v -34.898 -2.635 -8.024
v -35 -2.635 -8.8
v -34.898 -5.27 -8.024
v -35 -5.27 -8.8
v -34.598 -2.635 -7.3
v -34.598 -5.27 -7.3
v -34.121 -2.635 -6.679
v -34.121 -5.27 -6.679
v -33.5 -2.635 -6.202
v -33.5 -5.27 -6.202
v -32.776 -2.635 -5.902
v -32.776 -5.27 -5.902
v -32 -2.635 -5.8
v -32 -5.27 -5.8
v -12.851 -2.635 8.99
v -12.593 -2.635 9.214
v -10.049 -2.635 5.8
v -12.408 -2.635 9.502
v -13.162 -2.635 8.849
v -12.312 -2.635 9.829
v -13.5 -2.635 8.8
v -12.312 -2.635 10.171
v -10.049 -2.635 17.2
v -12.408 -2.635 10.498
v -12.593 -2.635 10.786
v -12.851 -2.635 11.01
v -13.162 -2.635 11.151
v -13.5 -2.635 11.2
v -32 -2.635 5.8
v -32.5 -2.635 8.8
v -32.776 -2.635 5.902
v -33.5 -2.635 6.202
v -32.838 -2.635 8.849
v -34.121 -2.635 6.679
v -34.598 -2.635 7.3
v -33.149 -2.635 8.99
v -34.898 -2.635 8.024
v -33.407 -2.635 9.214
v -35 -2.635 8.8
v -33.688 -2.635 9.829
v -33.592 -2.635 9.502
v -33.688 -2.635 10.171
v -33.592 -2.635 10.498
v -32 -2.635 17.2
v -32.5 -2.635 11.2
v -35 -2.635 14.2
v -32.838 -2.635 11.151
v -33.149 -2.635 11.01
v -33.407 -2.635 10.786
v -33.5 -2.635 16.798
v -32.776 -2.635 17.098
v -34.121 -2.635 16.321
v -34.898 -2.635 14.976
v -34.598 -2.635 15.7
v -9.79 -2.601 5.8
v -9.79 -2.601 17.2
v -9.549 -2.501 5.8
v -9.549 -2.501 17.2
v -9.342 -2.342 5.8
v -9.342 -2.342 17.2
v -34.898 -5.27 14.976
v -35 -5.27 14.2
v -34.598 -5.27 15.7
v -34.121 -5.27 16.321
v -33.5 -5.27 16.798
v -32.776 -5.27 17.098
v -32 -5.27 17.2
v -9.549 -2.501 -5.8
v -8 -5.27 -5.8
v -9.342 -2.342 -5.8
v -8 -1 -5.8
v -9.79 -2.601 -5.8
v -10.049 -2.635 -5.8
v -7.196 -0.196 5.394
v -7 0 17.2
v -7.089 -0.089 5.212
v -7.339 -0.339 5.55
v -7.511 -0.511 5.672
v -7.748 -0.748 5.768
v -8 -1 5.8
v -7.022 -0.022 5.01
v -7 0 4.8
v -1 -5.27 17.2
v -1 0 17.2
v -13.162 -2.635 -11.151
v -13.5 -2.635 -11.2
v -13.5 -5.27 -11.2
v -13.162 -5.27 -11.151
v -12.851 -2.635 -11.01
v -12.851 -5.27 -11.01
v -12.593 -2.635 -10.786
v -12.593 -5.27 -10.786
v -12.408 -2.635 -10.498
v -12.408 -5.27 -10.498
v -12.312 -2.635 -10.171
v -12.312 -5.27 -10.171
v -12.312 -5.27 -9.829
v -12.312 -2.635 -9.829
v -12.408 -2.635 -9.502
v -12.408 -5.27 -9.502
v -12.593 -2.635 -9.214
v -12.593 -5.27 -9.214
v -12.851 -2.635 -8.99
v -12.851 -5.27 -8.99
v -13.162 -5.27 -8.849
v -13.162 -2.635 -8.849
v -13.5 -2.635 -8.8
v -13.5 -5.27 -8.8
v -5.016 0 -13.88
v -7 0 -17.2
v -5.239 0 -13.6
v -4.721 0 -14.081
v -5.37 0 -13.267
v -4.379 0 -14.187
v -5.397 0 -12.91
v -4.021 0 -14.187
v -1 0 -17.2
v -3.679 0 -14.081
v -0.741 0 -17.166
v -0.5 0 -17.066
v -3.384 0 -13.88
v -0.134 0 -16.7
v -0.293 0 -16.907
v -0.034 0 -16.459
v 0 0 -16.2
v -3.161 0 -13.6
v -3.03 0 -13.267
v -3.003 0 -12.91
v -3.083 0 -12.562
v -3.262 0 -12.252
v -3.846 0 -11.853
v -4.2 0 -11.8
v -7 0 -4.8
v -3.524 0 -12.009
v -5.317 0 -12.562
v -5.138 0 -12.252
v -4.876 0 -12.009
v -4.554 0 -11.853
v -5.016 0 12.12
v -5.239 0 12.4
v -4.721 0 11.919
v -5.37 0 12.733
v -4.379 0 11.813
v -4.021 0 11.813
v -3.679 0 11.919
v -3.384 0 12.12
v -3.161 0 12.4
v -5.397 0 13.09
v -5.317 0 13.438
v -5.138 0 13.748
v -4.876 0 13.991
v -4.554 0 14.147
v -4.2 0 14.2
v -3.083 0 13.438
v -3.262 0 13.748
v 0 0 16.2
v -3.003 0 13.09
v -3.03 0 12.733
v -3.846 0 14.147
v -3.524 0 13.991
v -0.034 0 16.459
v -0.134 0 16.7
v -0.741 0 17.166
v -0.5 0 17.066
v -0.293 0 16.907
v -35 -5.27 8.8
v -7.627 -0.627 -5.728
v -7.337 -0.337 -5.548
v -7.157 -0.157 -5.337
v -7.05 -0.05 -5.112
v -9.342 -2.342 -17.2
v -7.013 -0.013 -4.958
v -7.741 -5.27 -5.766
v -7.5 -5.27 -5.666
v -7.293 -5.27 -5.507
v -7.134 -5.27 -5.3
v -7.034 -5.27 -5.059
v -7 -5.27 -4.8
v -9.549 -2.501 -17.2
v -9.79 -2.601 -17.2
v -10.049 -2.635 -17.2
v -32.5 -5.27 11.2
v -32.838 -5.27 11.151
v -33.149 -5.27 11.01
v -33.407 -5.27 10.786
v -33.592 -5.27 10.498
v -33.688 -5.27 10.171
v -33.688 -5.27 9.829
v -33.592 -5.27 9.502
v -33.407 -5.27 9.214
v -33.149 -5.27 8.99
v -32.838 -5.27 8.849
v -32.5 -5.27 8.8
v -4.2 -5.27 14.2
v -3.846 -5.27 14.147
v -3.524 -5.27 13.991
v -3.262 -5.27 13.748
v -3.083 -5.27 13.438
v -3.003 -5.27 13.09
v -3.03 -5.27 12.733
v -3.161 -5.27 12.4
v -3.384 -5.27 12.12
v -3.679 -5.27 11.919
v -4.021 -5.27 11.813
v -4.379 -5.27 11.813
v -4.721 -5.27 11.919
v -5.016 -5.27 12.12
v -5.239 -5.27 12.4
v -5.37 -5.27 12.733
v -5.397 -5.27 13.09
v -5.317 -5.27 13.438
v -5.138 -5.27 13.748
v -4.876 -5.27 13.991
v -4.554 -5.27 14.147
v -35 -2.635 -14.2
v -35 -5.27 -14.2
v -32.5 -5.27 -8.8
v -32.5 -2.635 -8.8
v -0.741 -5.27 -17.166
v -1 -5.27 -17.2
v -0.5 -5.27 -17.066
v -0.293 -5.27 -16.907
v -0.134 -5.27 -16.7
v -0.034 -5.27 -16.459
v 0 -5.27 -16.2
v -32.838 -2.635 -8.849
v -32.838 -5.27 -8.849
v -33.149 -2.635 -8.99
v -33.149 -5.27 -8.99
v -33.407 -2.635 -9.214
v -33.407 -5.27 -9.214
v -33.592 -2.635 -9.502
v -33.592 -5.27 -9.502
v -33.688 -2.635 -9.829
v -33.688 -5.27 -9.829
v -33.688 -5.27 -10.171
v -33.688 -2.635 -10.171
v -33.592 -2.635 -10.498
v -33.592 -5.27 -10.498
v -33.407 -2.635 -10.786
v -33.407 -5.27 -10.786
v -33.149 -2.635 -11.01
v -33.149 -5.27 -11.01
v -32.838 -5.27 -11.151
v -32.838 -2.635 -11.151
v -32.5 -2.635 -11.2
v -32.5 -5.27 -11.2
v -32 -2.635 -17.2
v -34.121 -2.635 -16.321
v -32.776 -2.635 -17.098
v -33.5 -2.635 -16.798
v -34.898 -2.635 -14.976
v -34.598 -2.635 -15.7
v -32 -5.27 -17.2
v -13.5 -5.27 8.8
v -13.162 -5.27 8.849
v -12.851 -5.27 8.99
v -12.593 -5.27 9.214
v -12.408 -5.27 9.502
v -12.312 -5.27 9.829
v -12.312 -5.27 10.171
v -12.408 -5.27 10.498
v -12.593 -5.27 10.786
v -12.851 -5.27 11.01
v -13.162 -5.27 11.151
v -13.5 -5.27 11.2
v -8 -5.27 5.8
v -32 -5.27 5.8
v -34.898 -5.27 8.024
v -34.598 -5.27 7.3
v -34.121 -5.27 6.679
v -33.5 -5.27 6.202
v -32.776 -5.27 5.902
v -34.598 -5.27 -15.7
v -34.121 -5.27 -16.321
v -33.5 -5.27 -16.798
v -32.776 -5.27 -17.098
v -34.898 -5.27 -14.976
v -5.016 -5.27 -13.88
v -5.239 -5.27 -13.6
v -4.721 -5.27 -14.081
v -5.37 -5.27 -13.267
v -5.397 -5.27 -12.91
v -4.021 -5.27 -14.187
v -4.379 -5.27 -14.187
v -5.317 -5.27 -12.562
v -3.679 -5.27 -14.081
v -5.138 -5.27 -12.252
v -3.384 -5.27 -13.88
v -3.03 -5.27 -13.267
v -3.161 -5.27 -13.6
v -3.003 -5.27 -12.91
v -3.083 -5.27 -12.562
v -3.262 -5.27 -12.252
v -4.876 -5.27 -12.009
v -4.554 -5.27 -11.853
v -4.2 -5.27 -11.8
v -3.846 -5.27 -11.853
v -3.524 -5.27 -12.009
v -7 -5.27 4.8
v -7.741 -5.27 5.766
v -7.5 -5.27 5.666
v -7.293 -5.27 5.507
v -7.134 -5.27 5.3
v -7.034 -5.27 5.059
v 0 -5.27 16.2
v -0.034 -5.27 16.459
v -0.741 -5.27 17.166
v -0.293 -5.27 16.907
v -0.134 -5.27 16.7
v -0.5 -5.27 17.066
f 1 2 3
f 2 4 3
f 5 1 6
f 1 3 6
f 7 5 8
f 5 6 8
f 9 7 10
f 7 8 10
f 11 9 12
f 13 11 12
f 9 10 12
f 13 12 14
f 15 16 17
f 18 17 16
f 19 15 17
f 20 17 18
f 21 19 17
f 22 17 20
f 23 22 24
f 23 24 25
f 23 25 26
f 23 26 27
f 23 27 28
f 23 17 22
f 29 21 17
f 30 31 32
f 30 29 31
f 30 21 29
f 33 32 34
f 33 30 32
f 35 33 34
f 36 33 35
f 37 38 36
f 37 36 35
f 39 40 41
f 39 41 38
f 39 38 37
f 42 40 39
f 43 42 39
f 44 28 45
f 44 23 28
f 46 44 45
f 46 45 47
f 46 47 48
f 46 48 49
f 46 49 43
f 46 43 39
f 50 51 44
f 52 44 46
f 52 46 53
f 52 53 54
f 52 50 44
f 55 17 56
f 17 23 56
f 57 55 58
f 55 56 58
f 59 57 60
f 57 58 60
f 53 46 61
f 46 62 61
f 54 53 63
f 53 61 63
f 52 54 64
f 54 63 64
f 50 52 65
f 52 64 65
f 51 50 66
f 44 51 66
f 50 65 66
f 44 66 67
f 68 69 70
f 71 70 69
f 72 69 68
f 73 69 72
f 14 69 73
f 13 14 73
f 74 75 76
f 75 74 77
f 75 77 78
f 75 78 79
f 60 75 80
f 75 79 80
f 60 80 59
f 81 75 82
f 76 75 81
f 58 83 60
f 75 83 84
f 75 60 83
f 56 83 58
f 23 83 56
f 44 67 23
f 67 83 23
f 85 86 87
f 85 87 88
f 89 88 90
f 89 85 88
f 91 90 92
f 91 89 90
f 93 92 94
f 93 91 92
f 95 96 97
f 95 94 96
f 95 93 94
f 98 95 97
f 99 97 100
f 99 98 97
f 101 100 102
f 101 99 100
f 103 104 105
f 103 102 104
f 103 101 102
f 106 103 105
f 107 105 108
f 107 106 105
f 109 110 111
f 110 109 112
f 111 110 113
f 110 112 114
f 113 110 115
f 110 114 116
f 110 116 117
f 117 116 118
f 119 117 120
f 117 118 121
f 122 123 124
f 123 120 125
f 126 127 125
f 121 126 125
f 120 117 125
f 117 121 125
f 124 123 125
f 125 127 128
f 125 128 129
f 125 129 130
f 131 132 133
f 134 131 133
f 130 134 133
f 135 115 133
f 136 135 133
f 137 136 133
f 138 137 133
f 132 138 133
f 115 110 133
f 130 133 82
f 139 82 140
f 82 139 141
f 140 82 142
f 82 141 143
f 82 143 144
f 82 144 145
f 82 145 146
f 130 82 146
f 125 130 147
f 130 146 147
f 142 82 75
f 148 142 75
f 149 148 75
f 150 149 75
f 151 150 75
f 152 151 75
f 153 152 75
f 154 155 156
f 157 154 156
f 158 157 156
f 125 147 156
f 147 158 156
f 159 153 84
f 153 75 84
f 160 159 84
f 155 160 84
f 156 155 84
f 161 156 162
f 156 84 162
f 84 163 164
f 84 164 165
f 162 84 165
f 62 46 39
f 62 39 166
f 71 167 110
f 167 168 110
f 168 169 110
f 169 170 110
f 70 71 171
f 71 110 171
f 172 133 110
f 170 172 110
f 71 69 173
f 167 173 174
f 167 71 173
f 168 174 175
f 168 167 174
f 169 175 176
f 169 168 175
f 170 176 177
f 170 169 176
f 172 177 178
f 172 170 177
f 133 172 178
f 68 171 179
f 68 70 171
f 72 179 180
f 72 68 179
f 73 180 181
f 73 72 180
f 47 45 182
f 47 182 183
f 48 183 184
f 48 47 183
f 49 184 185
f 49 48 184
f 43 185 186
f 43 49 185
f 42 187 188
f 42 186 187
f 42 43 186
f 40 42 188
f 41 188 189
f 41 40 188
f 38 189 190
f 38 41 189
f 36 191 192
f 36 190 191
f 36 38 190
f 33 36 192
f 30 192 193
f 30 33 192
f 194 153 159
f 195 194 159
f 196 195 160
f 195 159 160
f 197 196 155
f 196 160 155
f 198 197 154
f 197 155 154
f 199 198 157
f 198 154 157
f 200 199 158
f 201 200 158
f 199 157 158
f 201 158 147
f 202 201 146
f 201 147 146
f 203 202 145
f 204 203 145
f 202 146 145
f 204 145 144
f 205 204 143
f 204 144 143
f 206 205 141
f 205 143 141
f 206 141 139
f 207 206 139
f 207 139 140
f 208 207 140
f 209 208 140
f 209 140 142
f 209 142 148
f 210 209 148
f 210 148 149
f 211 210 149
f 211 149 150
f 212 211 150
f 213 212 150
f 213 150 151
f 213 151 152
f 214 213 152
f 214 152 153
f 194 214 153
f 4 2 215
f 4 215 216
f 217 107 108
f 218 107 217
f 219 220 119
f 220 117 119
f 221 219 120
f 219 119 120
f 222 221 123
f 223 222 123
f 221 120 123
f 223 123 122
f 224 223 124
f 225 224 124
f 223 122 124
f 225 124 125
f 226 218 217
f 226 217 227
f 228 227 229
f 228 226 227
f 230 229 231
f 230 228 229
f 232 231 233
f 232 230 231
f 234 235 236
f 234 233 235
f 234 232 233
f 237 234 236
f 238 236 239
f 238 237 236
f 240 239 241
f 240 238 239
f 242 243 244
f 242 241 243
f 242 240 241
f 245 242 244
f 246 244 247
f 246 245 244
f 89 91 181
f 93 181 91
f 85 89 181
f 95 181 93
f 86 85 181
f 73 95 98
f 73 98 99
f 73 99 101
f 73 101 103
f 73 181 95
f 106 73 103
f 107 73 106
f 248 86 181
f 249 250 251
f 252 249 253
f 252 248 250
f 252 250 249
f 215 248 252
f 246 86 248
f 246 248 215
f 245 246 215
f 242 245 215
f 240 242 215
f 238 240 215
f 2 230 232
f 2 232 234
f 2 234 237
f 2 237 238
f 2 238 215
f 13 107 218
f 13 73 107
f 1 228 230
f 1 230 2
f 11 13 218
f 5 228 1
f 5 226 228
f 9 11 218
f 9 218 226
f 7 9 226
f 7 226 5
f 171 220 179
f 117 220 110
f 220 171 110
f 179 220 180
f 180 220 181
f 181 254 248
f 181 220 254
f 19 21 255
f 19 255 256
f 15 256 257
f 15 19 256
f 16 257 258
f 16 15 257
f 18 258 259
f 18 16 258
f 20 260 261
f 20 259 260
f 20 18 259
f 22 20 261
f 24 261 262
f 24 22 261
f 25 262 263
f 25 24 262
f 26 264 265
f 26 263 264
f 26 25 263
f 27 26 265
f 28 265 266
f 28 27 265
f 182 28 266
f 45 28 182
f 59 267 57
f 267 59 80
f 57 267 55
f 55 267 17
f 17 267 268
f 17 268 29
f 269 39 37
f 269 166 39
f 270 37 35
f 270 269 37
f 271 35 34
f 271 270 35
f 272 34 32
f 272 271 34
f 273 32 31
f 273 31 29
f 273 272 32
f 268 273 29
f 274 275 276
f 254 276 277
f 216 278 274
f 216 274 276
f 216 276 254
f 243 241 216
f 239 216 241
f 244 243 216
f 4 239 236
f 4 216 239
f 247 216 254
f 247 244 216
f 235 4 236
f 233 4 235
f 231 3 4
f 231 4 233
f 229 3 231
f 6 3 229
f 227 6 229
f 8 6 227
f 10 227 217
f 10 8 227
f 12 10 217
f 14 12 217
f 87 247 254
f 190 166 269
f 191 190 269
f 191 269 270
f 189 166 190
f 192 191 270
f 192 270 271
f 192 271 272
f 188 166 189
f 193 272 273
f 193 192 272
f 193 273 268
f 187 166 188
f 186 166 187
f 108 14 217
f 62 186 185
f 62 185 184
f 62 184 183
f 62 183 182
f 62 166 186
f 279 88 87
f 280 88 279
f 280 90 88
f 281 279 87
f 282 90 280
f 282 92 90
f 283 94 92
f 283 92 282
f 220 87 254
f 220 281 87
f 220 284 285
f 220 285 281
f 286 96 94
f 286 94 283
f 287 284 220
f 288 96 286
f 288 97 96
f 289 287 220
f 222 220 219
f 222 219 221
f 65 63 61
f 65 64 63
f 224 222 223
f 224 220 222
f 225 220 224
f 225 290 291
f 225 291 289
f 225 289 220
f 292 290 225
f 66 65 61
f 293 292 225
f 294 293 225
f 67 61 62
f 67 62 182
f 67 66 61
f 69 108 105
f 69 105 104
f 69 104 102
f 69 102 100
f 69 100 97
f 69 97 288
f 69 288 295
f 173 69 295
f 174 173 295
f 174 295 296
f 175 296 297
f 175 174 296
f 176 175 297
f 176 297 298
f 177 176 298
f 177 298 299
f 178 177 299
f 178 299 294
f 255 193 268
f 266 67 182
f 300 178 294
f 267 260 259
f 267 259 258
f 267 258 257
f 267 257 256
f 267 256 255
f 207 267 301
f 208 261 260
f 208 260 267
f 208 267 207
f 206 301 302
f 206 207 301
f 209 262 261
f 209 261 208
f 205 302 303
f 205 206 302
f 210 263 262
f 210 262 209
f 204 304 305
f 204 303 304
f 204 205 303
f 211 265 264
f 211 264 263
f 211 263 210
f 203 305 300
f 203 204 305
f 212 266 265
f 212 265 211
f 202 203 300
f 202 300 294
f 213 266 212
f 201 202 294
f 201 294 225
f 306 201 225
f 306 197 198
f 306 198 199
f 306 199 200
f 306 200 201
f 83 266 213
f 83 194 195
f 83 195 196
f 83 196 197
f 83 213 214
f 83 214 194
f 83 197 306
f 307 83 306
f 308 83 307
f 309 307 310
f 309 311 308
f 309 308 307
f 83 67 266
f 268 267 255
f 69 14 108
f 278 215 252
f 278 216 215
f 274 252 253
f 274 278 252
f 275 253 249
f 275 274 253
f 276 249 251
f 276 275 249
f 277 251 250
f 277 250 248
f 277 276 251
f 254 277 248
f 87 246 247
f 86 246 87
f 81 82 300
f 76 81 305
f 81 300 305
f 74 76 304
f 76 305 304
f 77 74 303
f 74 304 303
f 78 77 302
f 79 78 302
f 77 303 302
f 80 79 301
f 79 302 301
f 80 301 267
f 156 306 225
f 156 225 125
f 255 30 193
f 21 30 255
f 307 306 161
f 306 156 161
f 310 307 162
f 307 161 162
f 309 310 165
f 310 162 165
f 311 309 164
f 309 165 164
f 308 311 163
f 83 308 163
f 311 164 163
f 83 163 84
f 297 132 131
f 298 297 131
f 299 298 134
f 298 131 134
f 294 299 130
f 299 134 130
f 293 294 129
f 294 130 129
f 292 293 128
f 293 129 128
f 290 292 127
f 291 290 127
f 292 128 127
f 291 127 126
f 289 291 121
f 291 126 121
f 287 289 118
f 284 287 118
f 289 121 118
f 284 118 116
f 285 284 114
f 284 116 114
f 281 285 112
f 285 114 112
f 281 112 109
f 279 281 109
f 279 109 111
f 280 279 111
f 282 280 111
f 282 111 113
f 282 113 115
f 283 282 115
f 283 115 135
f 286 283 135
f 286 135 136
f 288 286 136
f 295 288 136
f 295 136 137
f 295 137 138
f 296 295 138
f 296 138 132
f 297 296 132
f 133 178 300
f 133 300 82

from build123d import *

# Parameters (mm, degrees)
SKETCH1_W           = 7
SKETCH1_H           = 2.635
BOSS_EXTRUDE1_DEPTH = 17.2
CUT_EXTRUDE1_REACH  = 41.352
SKETCH2_R           = 1.2
CUT_EXTRUDE2_REACH  = 41.087
SKETCH3_W           = 28
SKETCH3_H           = 11.6
CHAMFER1_SIZE       = 2.635
FILLET2_R           = 1
FILLET3_R           = 3
FILLET4_R           = 1


with BuildPart() as part:
    # Sketch1 → Boss-Extrude1 (new, symmetric)
    with BuildSketch(Plane.XY):
        Polygon((0, -5.27), (0, -2.635), (-7, -2.635), (-35, -2.635), (-35, -5.27), align=None)
        with Locations((-3.5, -1.3175)):
            Rectangle(SKETCH1_W, SKETCH1_H)
    extrude(amount=BOSS_EXTRUDE1_DEPTH, both=True)

    # Sketch2 → Cut-Extrude1 (cut, up to next)
    with BuildSketch(Plane(origin=(0, 0, 0), x_dir=(1, 0, 0), z_dir=(0, 1, 0)), mode=Mode.PRIVATE) as cut_extrude1_sk1:
        with Locations(Location((-4.2, 13, 0), (0, 0, 270))):
            Circle(SKETCH2_R)
    cut_extrude1_tool1 = extrude(cut_extrude1_sk1.sketch, amount=-CUT_EXTRUDE1_REACH, mode=Mode.PRIVATE) & part.part
    # Sketch2 → Cut-Extrude1 (cut, up to next)
    with BuildSketch(Plane(origin=(0, 0, 0), x_dir=(1, 0, 0), z_dir=(0, 1, 0)), mode=Mode.PRIVATE) as cut_extrude1_sk2:
        with Locations(Location((-4.2, -13, 0), (0, 0, 270))):
            Circle(SKETCH2_R)
    cut_extrude1_tool2 = extrude(cut_extrude1_sk2.sketch, amount=-CUT_EXTRUDE1_REACH, mode=Mode.PRIVATE) & part.part
    add(cut_extrude1_tool1.solids().sort_by_distance((-4.2, 0, -13))[0], mode=Mode.SUBTRACT)
    add(cut_extrude1_tool2.solids().sort_by_distance((-4.2, 0, 13))[0], mode=Mode.SUBTRACT)

    # Sketch3 → Cut-Extrude2 (cut, up to next)
    with BuildSketch(Plane(origin=(0, -2.635, 0), x_dir=(1, 0, 0), z_dir=(0, 1, 0)), mode=Mode.PRIVATE) as cut_extrude2_sk1:
        with Locations((-21, 0)):
            Rectangle(SKETCH3_W, SKETCH3_H)
    cut_extrude2_tool1 = extrude(cut_extrude2_sk1.sketch, amount=-CUT_EXTRUDE2_REACH, mode=Mode.PRIVATE) & part.part
    # Sketch3 → Cut-Extrude2 (cut, up to next)
    with BuildSketch(Plane(origin=(0, -2.635, 0), x_dir=(1, 0, 0), z_dir=(0, 1, 0)), mode=Mode.PRIVATE) as cut_extrude2_sk2:
        with BuildLine():
            Line((-32.5, 11.2), (-13.5, 11.2))
            ThreePointArc((-13.5, 11.2), (-12.3, 10), (-13.5, 8.8))
            Line((-13.5, 8.8), (-32.5, 8.8))
            ThreePointArc((-32.5, 8.8), (-33.7, 10), (-32.5, 11.2))
        make_face()
    cut_extrude2_tool2 = extrude(cut_extrude2_sk2.sketch, amount=-CUT_EXTRUDE2_REACH, mode=Mode.PRIVATE) & part.part
    # Sketch3 → Cut-Extrude2 (cut, up to next)
    with BuildSketch(Plane(origin=(0, -2.635, 0), x_dir=(1, 0, 0), z_dir=(0, 1, 0)), mode=Mode.PRIVATE) as cut_extrude2_sk3:
        with BuildLine():
            Line((-32.5, -8.8), (-13.5, -8.8))
            ThreePointArc((-13.5, -8.8), (-12.3, -10), (-13.5, -11.2))
            Line((-13.5, -11.2), (-32.5, -11.2))
            ThreePointArc((-32.5, -11.2), (-33.7, -10), (-32.5, -8.8))
        make_face()
    cut_extrude2_tool3 = extrude(cut_extrude2_sk3.sketch, amount=-CUT_EXTRUDE2_REACH, mode=Mode.PRIVATE) & part.part
    add(cut_extrude2_tool1.solids().sort_by_distance((-21, -2.635, 0))[0], mode=Mode.SUBTRACT)
    add(cut_extrude2_tool2.solids().sort_by_distance((-23, -2.635, -10))[0], mode=Mode.SUBTRACT)
    add(cut_extrude2_tool3.solids().sort_by_distance((-23, -2.635, 10))[0], mode=Mode.SUBTRACT)

    # Chamfer1
    # the kernel refuses this chamfer: 2.635 mm, written as the material it adds along each edge
    with BuildSketch(Plane(origin=(-7, -2.635, 5.8), x_dir=(0.027495876610586358, 0.9996219169112968, 0), z_dir=(0, 0, 1))) as chamfer1_piece_1_section:
        Polygon((CHAMFER1_SIZE * 0.999621916911, CHAMFER1_SIZE * 0.0274958766106), (-CHAMFER1_SIZE * 0.0274958766106, CHAMFER1_SIZE * 0.999621916911), (0, 0), align=None)
    chamfer1_piece_1 = extrude(amount=11.4, mode=Mode.PRIVATE)
    chamfer1_piece_1 = split(chamfer1_piece_1, bisect_by=Plane(origin=(-7.870614947, 0, 11.5), z_dir=(0, -1, 0)), keep=Keep.TOP, mode=Mode.PRIVATE)
    add(chamfer1_piece_1)
    with BuildSketch(Plane(origin=(-7, -2.635, -17.2), x_dir=(0.027495876610586358, 0.9996219169112968, 0), z_dir=(0, 0, 1))) as chamfer1_piece_2_section:
        Polygon((CHAMFER1_SIZE * 0.999621916911, CHAMFER1_SIZE * 0.0274958766106), (-CHAMFER1_SIZE * 0.0274958766106, CHAMFER1_SIZE * 0.999621916911), (0, 0), align=None)
    chamfer1_piece_2 = extrude(amount=11.4, mode=Mode.PRIVATE)
    chamfer1_piece_2 = split(chamfer1_piece_2, bisect_by=Plane(origin=(-7.870614947, 0, -11.5), z_dir=(0, -1, 0)), keep=Keep.TOP, mode=Mode.PRIVATE)
    add(chamfer1_piece_2)

    # Fillet2
    fillet2_edges = [part.edges().sort_by_distance(p)[0] for p in [
        (-7, -2.635, -5.8),
        (-7, -2.635, 5.8),
        (-9.635, -2.635, 11.5),
        (-9.635, -2.635, -11.5),
    ]]
    fillet(fillet2_edges, radius=FILLET2_R)

    # Fillet3
    fillet3_edges = [part.edges().sort_by_distance(p)[0] for p in [
        (-35, -3.9525, -17.2),
        (-35, -3.9525, 17.2),
        (-35, -3.9525, 5.8),
        (-35, -3.9525, -5.8),
    ]]
    fillet(fillet3_edges, radius=FILLET3_R)

    # Fillet4
    fillet4_edges = [part.edges().sort_by_distance(p)[0] for p in [
        (0, -2.635, 17.2),
        (0, -2.635, -17.2),
    ]]
    fillet(fillet4_edges, radius=FILLET4_R)


solid = part.part
